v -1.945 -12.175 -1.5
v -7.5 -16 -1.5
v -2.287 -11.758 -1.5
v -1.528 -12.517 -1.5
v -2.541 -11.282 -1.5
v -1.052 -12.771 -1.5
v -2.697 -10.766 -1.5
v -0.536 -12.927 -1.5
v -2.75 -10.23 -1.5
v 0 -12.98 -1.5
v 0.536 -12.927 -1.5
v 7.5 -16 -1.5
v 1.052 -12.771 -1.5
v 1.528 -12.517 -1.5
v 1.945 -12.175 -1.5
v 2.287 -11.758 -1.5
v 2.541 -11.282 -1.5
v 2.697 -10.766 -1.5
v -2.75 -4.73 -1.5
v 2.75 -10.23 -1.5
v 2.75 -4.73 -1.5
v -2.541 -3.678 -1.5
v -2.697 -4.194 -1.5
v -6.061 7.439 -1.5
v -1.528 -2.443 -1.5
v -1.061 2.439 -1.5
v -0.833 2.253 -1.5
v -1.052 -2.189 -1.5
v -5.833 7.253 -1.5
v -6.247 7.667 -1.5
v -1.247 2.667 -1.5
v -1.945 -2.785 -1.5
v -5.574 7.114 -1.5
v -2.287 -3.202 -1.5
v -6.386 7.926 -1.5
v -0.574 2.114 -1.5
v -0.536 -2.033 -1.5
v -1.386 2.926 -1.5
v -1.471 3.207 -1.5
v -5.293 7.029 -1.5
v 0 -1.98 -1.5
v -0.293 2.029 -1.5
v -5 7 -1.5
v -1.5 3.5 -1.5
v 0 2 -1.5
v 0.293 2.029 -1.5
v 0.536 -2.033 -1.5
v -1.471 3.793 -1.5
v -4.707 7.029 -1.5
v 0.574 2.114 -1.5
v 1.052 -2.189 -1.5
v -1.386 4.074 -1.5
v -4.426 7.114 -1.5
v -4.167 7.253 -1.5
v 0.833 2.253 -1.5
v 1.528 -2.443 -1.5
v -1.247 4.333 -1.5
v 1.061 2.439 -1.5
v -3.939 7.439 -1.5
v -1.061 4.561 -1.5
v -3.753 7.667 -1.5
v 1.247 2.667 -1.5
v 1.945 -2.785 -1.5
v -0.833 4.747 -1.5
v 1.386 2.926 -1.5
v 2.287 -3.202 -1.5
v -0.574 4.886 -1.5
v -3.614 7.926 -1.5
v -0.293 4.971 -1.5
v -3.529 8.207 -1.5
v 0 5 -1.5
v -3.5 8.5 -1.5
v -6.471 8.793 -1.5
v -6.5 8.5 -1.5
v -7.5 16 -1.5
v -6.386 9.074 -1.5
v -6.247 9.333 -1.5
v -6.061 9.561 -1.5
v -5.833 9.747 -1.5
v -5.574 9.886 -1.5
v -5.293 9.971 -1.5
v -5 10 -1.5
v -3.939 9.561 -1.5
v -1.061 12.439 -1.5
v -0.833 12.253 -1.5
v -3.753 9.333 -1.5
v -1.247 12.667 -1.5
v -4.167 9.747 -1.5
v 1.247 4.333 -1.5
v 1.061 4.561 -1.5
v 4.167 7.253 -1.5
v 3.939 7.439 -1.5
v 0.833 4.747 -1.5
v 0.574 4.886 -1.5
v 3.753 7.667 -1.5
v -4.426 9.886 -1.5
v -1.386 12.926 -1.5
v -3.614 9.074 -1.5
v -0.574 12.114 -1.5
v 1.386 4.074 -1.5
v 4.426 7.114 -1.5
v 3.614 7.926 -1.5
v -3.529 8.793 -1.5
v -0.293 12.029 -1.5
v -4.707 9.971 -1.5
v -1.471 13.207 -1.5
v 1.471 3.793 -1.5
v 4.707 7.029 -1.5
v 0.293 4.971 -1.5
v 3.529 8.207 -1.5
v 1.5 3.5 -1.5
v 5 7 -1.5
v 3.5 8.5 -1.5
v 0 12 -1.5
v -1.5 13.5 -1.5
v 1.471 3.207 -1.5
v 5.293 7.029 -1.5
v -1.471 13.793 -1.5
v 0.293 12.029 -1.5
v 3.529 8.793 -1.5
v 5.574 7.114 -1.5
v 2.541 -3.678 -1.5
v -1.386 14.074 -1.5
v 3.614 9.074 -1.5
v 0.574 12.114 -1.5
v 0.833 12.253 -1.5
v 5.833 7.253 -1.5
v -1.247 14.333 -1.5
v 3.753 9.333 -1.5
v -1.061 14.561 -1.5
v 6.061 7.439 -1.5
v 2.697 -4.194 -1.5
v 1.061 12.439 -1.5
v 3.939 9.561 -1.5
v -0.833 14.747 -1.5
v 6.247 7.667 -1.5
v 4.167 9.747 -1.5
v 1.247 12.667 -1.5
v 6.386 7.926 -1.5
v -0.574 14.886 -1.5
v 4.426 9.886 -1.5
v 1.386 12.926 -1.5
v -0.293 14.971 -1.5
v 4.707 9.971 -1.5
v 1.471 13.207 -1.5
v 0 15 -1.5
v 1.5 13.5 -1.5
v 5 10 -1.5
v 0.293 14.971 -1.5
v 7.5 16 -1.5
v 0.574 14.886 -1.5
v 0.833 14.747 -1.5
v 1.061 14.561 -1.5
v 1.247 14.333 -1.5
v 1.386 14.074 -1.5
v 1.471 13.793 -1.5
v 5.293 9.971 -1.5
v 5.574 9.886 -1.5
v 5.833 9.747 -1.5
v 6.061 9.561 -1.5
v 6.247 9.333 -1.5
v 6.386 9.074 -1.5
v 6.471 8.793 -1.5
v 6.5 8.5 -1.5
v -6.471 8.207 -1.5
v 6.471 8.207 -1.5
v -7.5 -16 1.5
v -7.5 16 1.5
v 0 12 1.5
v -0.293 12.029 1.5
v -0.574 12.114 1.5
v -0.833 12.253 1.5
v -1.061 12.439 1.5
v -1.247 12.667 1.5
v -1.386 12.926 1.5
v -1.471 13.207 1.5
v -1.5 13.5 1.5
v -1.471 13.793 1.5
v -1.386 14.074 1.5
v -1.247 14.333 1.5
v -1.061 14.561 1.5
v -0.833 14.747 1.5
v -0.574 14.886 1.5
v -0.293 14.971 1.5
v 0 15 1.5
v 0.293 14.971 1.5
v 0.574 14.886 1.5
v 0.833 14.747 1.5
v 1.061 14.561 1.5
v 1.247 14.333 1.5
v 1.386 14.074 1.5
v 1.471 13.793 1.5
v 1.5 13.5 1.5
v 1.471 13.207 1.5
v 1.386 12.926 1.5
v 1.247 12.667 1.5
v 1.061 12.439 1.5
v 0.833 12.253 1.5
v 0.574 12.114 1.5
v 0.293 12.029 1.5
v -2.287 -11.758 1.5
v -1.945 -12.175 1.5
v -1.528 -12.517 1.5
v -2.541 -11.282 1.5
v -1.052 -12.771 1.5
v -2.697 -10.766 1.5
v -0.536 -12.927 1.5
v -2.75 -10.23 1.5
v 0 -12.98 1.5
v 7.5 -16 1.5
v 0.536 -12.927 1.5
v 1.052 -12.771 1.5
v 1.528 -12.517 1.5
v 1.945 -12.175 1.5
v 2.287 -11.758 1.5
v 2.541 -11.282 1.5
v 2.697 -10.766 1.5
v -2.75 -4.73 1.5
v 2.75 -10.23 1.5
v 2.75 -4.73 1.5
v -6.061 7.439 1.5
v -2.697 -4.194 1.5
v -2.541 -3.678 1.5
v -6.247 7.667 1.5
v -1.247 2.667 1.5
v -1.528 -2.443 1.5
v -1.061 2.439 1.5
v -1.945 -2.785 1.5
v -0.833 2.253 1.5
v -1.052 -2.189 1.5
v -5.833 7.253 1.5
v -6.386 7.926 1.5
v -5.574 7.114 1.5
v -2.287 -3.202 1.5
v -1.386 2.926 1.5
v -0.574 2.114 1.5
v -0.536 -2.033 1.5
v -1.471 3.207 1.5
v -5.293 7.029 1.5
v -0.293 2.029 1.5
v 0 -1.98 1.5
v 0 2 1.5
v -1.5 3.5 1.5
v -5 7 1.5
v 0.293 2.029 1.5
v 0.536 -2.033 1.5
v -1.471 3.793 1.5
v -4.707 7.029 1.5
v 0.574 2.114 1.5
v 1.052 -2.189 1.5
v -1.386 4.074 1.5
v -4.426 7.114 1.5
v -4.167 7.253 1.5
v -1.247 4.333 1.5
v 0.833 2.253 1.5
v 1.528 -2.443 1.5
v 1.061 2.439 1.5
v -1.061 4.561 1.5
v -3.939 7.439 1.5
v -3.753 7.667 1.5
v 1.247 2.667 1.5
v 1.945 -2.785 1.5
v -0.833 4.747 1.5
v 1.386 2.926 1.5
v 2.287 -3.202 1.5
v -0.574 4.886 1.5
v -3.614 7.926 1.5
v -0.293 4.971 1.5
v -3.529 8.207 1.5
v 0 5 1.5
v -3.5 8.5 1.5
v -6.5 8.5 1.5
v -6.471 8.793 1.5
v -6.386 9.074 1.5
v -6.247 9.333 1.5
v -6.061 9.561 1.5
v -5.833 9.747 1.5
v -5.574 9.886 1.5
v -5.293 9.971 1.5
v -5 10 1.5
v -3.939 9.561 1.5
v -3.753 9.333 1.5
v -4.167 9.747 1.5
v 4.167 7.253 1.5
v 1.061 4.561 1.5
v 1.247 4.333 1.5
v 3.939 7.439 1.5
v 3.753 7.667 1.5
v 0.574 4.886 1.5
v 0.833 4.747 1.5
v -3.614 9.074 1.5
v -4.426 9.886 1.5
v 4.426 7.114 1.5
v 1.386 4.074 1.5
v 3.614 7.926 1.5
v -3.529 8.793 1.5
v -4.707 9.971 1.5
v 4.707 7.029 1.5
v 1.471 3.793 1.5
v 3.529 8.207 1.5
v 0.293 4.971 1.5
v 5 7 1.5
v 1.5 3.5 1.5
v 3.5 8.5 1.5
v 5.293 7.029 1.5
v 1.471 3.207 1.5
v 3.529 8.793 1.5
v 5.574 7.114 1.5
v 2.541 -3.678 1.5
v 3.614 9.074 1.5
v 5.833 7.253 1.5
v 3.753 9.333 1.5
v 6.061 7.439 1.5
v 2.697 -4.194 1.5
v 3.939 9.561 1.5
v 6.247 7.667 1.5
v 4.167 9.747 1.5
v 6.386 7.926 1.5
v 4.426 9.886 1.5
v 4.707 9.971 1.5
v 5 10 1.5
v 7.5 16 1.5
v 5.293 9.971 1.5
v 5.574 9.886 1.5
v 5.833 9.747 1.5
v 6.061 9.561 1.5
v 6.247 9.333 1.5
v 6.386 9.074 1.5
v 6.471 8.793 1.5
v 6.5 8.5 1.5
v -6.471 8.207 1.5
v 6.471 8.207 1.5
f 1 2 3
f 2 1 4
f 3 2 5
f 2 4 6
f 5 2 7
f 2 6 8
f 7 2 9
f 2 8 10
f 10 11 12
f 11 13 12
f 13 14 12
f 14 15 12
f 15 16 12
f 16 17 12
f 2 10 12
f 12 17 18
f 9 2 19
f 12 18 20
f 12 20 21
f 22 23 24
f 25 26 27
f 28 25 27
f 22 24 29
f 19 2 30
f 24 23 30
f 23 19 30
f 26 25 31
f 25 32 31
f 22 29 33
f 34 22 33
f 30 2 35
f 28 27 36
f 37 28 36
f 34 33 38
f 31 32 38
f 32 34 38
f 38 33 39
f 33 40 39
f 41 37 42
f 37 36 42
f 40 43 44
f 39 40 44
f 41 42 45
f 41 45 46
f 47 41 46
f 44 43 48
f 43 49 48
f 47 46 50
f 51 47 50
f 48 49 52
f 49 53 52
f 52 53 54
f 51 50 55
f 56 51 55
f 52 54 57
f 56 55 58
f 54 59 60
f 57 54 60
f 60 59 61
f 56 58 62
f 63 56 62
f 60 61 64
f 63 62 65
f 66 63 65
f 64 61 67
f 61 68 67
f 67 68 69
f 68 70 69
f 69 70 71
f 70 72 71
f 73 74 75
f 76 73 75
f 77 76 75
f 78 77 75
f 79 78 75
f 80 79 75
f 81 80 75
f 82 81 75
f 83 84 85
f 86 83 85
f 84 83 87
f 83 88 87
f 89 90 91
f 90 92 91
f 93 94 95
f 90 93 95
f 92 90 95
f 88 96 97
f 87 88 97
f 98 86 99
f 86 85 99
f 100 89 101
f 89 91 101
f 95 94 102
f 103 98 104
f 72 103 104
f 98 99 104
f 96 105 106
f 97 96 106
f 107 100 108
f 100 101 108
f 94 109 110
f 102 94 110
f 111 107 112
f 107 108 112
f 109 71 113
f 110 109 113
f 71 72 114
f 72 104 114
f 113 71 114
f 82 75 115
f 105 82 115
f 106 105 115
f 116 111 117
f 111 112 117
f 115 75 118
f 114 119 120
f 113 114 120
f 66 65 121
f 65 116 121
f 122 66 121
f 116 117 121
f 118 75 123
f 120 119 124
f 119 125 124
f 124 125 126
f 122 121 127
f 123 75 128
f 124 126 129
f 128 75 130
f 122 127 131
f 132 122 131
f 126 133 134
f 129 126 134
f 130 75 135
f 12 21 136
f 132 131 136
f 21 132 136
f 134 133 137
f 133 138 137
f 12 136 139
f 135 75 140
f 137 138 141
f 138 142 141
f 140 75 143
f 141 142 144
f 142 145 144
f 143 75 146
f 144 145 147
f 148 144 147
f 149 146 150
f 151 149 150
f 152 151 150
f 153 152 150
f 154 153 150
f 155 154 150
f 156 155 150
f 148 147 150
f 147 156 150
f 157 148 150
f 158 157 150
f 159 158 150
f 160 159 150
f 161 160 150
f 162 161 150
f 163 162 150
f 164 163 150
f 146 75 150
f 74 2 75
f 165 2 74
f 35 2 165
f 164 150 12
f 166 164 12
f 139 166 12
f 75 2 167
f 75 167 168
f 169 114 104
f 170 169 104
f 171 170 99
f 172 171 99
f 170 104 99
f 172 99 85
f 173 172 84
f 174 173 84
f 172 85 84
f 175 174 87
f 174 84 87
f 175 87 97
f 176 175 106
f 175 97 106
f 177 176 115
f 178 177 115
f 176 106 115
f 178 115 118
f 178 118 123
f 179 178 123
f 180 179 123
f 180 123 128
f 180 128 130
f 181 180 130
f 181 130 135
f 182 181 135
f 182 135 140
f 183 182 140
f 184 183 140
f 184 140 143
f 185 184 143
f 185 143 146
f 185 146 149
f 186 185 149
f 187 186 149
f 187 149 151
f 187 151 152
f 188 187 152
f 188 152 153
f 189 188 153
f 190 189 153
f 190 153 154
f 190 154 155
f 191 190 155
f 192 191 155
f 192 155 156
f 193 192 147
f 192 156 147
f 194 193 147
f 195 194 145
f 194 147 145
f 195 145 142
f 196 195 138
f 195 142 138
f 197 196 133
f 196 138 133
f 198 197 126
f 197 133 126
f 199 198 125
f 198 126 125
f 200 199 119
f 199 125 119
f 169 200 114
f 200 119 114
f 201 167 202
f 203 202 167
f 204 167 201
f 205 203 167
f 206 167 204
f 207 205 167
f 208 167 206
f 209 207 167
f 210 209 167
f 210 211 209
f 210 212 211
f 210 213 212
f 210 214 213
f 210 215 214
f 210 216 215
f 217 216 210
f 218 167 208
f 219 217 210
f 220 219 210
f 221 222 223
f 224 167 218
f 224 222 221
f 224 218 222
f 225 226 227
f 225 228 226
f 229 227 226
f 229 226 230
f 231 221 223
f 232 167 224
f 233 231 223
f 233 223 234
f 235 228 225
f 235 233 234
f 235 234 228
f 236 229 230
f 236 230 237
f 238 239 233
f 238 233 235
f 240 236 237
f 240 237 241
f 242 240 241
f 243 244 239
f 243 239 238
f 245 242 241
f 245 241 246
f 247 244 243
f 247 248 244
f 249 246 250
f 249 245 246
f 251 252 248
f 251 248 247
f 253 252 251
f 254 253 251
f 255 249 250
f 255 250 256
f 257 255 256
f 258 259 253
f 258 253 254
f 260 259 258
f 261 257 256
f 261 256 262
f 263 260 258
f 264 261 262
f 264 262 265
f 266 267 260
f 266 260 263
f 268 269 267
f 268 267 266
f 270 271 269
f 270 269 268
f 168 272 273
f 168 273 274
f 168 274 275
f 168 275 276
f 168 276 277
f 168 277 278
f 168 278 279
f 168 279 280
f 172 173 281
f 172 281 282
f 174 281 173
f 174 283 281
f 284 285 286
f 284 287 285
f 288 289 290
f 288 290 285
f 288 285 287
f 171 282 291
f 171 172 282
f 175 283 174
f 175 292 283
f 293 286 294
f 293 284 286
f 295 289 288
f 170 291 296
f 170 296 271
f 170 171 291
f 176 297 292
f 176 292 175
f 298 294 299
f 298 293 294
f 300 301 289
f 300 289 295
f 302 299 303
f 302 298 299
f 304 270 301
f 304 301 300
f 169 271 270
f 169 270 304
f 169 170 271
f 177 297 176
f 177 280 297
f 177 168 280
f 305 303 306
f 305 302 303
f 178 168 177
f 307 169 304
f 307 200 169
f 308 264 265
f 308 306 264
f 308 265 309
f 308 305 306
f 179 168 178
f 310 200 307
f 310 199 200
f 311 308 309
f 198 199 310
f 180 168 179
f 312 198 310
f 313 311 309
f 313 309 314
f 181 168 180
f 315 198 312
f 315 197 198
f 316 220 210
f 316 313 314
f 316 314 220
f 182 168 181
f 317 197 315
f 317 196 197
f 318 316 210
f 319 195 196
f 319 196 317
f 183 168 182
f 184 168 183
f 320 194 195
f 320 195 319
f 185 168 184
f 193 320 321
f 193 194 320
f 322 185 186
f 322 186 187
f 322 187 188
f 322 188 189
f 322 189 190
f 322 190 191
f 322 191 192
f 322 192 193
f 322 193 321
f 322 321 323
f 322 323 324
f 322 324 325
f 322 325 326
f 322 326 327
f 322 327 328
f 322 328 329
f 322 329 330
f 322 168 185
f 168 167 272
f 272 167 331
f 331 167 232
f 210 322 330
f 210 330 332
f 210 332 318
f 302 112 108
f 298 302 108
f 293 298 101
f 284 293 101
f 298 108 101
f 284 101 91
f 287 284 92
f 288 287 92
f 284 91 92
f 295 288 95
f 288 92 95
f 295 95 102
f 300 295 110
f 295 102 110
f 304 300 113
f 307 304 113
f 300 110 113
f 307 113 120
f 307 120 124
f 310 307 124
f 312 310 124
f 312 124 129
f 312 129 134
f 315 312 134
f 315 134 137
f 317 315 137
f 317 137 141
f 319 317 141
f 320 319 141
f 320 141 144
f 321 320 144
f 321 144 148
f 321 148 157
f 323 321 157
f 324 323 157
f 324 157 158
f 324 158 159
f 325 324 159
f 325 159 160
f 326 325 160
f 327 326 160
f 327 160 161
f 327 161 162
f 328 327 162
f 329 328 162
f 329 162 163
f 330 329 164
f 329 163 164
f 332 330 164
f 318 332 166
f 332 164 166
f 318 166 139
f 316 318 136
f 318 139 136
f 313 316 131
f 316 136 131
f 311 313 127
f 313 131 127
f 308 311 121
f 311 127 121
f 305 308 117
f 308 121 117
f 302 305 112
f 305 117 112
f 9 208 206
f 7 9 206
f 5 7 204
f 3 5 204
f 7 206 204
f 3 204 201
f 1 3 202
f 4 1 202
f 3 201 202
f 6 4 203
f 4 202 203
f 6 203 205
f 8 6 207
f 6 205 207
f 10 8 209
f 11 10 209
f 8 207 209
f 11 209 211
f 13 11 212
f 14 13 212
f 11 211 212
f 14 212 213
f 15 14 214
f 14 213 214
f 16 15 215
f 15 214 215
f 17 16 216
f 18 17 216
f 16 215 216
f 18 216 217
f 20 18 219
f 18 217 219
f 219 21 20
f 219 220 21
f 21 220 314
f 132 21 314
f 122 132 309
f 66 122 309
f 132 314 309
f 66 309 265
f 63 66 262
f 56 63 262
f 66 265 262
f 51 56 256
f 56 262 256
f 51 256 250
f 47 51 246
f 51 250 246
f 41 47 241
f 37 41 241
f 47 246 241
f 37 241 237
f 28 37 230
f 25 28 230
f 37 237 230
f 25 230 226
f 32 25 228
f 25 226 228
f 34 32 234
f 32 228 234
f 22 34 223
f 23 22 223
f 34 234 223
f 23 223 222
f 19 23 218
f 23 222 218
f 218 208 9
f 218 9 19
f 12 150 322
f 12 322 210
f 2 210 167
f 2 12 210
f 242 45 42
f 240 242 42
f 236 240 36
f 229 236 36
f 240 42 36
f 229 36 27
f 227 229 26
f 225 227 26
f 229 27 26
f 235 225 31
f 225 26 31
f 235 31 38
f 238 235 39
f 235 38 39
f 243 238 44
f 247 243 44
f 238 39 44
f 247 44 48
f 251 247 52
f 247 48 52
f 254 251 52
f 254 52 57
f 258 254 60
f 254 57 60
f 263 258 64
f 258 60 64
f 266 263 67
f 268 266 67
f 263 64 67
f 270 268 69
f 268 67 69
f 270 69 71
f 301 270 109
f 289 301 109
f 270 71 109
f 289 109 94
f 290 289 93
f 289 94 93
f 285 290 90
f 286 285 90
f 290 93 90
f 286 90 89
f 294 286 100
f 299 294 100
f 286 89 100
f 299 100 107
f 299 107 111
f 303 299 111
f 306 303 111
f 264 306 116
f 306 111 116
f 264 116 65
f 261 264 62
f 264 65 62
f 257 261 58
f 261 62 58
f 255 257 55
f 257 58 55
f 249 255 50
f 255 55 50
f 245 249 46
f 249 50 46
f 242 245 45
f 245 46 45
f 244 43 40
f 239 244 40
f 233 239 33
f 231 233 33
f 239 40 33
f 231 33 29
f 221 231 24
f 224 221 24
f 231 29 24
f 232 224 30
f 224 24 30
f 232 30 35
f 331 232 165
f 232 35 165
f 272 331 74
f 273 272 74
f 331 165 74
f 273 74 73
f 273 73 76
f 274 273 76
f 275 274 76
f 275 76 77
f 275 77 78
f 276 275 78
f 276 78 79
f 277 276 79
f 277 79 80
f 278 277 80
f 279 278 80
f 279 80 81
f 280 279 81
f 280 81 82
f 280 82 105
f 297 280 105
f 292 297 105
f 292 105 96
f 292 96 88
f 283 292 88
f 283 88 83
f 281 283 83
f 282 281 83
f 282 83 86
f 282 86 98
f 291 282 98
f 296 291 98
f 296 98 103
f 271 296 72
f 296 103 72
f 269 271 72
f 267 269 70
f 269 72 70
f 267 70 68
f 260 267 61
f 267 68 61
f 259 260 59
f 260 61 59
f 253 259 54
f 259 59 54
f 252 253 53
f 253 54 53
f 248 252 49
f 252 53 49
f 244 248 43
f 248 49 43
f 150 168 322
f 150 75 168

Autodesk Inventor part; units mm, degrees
ref_plane "YZ Plane" through (0, 0, 0) normal (1, 0, 0) x (0, 1, 0)
ref_plane "XZ Plane" through (0, 0, 0) normal (0, 1, 0) x (-1, 0, 0)
ref_plane "XY Plane" through (0, 0, 0) normal (0, 0, 1) x (1, 0, 0)
sketch "Sketch1" plane through (0, 0, 0) normal (0, 0, 1) x (1, 0, 0)
  line L0 (-7.5, 16) -> (7.5, 16)
  line L1 (7.5, 16) -> (7.5, -16)
  line L2 (7.5, -16) -> (-7.5, -16)
  line L3 (-7.5, -16) -> (-7.5, 16)
  line L4 (-7.5, 16) -> (7.5, -16) construction
  line L5 (7.5, 16) -> (-7.5, -16) construction
  point P0 (0, 0)
  dimension "d0" = 32
  dimension "d2" = 15
extrude "Extrusion1" add sketch "Sketch1" along normal mid plane 3
sketch "Sketch2" plane through (0, 0, 1.5) normal (0, 0, 1) x (1, 0, 0)
  line L0 (7.5, 16) -> (-7.5, 16) projected
  line L1 (-7.5, -16) -> (7.5, -16) projected
  line L2 (0, 16) -> (0, -16) construction
  point P0 (0, 0)
  point P1 (0, 13.5)
  point P2 (0, 3.5)
  point P3 (-5, 8.5)
  point P4 (5, 8.5)
  dimension "d5" = 10
  dimension "d7" = 10
  dimension "d8" = 5
  dimension "d9" = 2.5
  dimension "d10" = 5
hole "Hole1" at (0, 13.5, 1.5) at (0, 3.5, 1.5) at (-5, 8.5, 1.5) at (5, 8.5, 1.5) direction (0, 0, -1) diameter 3 end through all
sketch "Sketch3" plane through (0, 0, 1.5) normal (0, 0, 1) x (1, 0, 0)
  line L0 (-7.5, -16) -> (7.5, -16) projected
  line L1 (7.5, -16) -> (7.5, 16) projected
  line L2 (0, -23.093) -> (0, 0) construction
  line L3 (-2.75, -4.73) -> (2.75, -4.73)
  line L4 (2.75, -4.73) -> (2.75, -10.23)
  line L5 (2.75, -10.23) -> (-2.75, -10.23)
  line L6 (-2.75, -10.23) -> (-2.75, -4.73)
  line L7 (-2.75, -4.73) -> (2.75, -10.23) construction
  line L8 (2.75, -4.73) -> (-2.75, -10.23) construction
  arc A0 (-2.75, -10.23) -> (2.75, -10.23) centre (0, -10.23) ccw
  arc A1 (2.75, -4.73) -> (-2.75, -4.73) centre (0, -4.73) ccw
  point P0 (0, -7.48)
  dimension "d18" = 5.5
  dimension "d20" = 5.5
  dimension "d21" = 3.02
extrude "Extrusion2" cut sketch "Sketch3" against normal through all
properties part number "Micro Limit Switch Plate" material "Aluminum 6061"
